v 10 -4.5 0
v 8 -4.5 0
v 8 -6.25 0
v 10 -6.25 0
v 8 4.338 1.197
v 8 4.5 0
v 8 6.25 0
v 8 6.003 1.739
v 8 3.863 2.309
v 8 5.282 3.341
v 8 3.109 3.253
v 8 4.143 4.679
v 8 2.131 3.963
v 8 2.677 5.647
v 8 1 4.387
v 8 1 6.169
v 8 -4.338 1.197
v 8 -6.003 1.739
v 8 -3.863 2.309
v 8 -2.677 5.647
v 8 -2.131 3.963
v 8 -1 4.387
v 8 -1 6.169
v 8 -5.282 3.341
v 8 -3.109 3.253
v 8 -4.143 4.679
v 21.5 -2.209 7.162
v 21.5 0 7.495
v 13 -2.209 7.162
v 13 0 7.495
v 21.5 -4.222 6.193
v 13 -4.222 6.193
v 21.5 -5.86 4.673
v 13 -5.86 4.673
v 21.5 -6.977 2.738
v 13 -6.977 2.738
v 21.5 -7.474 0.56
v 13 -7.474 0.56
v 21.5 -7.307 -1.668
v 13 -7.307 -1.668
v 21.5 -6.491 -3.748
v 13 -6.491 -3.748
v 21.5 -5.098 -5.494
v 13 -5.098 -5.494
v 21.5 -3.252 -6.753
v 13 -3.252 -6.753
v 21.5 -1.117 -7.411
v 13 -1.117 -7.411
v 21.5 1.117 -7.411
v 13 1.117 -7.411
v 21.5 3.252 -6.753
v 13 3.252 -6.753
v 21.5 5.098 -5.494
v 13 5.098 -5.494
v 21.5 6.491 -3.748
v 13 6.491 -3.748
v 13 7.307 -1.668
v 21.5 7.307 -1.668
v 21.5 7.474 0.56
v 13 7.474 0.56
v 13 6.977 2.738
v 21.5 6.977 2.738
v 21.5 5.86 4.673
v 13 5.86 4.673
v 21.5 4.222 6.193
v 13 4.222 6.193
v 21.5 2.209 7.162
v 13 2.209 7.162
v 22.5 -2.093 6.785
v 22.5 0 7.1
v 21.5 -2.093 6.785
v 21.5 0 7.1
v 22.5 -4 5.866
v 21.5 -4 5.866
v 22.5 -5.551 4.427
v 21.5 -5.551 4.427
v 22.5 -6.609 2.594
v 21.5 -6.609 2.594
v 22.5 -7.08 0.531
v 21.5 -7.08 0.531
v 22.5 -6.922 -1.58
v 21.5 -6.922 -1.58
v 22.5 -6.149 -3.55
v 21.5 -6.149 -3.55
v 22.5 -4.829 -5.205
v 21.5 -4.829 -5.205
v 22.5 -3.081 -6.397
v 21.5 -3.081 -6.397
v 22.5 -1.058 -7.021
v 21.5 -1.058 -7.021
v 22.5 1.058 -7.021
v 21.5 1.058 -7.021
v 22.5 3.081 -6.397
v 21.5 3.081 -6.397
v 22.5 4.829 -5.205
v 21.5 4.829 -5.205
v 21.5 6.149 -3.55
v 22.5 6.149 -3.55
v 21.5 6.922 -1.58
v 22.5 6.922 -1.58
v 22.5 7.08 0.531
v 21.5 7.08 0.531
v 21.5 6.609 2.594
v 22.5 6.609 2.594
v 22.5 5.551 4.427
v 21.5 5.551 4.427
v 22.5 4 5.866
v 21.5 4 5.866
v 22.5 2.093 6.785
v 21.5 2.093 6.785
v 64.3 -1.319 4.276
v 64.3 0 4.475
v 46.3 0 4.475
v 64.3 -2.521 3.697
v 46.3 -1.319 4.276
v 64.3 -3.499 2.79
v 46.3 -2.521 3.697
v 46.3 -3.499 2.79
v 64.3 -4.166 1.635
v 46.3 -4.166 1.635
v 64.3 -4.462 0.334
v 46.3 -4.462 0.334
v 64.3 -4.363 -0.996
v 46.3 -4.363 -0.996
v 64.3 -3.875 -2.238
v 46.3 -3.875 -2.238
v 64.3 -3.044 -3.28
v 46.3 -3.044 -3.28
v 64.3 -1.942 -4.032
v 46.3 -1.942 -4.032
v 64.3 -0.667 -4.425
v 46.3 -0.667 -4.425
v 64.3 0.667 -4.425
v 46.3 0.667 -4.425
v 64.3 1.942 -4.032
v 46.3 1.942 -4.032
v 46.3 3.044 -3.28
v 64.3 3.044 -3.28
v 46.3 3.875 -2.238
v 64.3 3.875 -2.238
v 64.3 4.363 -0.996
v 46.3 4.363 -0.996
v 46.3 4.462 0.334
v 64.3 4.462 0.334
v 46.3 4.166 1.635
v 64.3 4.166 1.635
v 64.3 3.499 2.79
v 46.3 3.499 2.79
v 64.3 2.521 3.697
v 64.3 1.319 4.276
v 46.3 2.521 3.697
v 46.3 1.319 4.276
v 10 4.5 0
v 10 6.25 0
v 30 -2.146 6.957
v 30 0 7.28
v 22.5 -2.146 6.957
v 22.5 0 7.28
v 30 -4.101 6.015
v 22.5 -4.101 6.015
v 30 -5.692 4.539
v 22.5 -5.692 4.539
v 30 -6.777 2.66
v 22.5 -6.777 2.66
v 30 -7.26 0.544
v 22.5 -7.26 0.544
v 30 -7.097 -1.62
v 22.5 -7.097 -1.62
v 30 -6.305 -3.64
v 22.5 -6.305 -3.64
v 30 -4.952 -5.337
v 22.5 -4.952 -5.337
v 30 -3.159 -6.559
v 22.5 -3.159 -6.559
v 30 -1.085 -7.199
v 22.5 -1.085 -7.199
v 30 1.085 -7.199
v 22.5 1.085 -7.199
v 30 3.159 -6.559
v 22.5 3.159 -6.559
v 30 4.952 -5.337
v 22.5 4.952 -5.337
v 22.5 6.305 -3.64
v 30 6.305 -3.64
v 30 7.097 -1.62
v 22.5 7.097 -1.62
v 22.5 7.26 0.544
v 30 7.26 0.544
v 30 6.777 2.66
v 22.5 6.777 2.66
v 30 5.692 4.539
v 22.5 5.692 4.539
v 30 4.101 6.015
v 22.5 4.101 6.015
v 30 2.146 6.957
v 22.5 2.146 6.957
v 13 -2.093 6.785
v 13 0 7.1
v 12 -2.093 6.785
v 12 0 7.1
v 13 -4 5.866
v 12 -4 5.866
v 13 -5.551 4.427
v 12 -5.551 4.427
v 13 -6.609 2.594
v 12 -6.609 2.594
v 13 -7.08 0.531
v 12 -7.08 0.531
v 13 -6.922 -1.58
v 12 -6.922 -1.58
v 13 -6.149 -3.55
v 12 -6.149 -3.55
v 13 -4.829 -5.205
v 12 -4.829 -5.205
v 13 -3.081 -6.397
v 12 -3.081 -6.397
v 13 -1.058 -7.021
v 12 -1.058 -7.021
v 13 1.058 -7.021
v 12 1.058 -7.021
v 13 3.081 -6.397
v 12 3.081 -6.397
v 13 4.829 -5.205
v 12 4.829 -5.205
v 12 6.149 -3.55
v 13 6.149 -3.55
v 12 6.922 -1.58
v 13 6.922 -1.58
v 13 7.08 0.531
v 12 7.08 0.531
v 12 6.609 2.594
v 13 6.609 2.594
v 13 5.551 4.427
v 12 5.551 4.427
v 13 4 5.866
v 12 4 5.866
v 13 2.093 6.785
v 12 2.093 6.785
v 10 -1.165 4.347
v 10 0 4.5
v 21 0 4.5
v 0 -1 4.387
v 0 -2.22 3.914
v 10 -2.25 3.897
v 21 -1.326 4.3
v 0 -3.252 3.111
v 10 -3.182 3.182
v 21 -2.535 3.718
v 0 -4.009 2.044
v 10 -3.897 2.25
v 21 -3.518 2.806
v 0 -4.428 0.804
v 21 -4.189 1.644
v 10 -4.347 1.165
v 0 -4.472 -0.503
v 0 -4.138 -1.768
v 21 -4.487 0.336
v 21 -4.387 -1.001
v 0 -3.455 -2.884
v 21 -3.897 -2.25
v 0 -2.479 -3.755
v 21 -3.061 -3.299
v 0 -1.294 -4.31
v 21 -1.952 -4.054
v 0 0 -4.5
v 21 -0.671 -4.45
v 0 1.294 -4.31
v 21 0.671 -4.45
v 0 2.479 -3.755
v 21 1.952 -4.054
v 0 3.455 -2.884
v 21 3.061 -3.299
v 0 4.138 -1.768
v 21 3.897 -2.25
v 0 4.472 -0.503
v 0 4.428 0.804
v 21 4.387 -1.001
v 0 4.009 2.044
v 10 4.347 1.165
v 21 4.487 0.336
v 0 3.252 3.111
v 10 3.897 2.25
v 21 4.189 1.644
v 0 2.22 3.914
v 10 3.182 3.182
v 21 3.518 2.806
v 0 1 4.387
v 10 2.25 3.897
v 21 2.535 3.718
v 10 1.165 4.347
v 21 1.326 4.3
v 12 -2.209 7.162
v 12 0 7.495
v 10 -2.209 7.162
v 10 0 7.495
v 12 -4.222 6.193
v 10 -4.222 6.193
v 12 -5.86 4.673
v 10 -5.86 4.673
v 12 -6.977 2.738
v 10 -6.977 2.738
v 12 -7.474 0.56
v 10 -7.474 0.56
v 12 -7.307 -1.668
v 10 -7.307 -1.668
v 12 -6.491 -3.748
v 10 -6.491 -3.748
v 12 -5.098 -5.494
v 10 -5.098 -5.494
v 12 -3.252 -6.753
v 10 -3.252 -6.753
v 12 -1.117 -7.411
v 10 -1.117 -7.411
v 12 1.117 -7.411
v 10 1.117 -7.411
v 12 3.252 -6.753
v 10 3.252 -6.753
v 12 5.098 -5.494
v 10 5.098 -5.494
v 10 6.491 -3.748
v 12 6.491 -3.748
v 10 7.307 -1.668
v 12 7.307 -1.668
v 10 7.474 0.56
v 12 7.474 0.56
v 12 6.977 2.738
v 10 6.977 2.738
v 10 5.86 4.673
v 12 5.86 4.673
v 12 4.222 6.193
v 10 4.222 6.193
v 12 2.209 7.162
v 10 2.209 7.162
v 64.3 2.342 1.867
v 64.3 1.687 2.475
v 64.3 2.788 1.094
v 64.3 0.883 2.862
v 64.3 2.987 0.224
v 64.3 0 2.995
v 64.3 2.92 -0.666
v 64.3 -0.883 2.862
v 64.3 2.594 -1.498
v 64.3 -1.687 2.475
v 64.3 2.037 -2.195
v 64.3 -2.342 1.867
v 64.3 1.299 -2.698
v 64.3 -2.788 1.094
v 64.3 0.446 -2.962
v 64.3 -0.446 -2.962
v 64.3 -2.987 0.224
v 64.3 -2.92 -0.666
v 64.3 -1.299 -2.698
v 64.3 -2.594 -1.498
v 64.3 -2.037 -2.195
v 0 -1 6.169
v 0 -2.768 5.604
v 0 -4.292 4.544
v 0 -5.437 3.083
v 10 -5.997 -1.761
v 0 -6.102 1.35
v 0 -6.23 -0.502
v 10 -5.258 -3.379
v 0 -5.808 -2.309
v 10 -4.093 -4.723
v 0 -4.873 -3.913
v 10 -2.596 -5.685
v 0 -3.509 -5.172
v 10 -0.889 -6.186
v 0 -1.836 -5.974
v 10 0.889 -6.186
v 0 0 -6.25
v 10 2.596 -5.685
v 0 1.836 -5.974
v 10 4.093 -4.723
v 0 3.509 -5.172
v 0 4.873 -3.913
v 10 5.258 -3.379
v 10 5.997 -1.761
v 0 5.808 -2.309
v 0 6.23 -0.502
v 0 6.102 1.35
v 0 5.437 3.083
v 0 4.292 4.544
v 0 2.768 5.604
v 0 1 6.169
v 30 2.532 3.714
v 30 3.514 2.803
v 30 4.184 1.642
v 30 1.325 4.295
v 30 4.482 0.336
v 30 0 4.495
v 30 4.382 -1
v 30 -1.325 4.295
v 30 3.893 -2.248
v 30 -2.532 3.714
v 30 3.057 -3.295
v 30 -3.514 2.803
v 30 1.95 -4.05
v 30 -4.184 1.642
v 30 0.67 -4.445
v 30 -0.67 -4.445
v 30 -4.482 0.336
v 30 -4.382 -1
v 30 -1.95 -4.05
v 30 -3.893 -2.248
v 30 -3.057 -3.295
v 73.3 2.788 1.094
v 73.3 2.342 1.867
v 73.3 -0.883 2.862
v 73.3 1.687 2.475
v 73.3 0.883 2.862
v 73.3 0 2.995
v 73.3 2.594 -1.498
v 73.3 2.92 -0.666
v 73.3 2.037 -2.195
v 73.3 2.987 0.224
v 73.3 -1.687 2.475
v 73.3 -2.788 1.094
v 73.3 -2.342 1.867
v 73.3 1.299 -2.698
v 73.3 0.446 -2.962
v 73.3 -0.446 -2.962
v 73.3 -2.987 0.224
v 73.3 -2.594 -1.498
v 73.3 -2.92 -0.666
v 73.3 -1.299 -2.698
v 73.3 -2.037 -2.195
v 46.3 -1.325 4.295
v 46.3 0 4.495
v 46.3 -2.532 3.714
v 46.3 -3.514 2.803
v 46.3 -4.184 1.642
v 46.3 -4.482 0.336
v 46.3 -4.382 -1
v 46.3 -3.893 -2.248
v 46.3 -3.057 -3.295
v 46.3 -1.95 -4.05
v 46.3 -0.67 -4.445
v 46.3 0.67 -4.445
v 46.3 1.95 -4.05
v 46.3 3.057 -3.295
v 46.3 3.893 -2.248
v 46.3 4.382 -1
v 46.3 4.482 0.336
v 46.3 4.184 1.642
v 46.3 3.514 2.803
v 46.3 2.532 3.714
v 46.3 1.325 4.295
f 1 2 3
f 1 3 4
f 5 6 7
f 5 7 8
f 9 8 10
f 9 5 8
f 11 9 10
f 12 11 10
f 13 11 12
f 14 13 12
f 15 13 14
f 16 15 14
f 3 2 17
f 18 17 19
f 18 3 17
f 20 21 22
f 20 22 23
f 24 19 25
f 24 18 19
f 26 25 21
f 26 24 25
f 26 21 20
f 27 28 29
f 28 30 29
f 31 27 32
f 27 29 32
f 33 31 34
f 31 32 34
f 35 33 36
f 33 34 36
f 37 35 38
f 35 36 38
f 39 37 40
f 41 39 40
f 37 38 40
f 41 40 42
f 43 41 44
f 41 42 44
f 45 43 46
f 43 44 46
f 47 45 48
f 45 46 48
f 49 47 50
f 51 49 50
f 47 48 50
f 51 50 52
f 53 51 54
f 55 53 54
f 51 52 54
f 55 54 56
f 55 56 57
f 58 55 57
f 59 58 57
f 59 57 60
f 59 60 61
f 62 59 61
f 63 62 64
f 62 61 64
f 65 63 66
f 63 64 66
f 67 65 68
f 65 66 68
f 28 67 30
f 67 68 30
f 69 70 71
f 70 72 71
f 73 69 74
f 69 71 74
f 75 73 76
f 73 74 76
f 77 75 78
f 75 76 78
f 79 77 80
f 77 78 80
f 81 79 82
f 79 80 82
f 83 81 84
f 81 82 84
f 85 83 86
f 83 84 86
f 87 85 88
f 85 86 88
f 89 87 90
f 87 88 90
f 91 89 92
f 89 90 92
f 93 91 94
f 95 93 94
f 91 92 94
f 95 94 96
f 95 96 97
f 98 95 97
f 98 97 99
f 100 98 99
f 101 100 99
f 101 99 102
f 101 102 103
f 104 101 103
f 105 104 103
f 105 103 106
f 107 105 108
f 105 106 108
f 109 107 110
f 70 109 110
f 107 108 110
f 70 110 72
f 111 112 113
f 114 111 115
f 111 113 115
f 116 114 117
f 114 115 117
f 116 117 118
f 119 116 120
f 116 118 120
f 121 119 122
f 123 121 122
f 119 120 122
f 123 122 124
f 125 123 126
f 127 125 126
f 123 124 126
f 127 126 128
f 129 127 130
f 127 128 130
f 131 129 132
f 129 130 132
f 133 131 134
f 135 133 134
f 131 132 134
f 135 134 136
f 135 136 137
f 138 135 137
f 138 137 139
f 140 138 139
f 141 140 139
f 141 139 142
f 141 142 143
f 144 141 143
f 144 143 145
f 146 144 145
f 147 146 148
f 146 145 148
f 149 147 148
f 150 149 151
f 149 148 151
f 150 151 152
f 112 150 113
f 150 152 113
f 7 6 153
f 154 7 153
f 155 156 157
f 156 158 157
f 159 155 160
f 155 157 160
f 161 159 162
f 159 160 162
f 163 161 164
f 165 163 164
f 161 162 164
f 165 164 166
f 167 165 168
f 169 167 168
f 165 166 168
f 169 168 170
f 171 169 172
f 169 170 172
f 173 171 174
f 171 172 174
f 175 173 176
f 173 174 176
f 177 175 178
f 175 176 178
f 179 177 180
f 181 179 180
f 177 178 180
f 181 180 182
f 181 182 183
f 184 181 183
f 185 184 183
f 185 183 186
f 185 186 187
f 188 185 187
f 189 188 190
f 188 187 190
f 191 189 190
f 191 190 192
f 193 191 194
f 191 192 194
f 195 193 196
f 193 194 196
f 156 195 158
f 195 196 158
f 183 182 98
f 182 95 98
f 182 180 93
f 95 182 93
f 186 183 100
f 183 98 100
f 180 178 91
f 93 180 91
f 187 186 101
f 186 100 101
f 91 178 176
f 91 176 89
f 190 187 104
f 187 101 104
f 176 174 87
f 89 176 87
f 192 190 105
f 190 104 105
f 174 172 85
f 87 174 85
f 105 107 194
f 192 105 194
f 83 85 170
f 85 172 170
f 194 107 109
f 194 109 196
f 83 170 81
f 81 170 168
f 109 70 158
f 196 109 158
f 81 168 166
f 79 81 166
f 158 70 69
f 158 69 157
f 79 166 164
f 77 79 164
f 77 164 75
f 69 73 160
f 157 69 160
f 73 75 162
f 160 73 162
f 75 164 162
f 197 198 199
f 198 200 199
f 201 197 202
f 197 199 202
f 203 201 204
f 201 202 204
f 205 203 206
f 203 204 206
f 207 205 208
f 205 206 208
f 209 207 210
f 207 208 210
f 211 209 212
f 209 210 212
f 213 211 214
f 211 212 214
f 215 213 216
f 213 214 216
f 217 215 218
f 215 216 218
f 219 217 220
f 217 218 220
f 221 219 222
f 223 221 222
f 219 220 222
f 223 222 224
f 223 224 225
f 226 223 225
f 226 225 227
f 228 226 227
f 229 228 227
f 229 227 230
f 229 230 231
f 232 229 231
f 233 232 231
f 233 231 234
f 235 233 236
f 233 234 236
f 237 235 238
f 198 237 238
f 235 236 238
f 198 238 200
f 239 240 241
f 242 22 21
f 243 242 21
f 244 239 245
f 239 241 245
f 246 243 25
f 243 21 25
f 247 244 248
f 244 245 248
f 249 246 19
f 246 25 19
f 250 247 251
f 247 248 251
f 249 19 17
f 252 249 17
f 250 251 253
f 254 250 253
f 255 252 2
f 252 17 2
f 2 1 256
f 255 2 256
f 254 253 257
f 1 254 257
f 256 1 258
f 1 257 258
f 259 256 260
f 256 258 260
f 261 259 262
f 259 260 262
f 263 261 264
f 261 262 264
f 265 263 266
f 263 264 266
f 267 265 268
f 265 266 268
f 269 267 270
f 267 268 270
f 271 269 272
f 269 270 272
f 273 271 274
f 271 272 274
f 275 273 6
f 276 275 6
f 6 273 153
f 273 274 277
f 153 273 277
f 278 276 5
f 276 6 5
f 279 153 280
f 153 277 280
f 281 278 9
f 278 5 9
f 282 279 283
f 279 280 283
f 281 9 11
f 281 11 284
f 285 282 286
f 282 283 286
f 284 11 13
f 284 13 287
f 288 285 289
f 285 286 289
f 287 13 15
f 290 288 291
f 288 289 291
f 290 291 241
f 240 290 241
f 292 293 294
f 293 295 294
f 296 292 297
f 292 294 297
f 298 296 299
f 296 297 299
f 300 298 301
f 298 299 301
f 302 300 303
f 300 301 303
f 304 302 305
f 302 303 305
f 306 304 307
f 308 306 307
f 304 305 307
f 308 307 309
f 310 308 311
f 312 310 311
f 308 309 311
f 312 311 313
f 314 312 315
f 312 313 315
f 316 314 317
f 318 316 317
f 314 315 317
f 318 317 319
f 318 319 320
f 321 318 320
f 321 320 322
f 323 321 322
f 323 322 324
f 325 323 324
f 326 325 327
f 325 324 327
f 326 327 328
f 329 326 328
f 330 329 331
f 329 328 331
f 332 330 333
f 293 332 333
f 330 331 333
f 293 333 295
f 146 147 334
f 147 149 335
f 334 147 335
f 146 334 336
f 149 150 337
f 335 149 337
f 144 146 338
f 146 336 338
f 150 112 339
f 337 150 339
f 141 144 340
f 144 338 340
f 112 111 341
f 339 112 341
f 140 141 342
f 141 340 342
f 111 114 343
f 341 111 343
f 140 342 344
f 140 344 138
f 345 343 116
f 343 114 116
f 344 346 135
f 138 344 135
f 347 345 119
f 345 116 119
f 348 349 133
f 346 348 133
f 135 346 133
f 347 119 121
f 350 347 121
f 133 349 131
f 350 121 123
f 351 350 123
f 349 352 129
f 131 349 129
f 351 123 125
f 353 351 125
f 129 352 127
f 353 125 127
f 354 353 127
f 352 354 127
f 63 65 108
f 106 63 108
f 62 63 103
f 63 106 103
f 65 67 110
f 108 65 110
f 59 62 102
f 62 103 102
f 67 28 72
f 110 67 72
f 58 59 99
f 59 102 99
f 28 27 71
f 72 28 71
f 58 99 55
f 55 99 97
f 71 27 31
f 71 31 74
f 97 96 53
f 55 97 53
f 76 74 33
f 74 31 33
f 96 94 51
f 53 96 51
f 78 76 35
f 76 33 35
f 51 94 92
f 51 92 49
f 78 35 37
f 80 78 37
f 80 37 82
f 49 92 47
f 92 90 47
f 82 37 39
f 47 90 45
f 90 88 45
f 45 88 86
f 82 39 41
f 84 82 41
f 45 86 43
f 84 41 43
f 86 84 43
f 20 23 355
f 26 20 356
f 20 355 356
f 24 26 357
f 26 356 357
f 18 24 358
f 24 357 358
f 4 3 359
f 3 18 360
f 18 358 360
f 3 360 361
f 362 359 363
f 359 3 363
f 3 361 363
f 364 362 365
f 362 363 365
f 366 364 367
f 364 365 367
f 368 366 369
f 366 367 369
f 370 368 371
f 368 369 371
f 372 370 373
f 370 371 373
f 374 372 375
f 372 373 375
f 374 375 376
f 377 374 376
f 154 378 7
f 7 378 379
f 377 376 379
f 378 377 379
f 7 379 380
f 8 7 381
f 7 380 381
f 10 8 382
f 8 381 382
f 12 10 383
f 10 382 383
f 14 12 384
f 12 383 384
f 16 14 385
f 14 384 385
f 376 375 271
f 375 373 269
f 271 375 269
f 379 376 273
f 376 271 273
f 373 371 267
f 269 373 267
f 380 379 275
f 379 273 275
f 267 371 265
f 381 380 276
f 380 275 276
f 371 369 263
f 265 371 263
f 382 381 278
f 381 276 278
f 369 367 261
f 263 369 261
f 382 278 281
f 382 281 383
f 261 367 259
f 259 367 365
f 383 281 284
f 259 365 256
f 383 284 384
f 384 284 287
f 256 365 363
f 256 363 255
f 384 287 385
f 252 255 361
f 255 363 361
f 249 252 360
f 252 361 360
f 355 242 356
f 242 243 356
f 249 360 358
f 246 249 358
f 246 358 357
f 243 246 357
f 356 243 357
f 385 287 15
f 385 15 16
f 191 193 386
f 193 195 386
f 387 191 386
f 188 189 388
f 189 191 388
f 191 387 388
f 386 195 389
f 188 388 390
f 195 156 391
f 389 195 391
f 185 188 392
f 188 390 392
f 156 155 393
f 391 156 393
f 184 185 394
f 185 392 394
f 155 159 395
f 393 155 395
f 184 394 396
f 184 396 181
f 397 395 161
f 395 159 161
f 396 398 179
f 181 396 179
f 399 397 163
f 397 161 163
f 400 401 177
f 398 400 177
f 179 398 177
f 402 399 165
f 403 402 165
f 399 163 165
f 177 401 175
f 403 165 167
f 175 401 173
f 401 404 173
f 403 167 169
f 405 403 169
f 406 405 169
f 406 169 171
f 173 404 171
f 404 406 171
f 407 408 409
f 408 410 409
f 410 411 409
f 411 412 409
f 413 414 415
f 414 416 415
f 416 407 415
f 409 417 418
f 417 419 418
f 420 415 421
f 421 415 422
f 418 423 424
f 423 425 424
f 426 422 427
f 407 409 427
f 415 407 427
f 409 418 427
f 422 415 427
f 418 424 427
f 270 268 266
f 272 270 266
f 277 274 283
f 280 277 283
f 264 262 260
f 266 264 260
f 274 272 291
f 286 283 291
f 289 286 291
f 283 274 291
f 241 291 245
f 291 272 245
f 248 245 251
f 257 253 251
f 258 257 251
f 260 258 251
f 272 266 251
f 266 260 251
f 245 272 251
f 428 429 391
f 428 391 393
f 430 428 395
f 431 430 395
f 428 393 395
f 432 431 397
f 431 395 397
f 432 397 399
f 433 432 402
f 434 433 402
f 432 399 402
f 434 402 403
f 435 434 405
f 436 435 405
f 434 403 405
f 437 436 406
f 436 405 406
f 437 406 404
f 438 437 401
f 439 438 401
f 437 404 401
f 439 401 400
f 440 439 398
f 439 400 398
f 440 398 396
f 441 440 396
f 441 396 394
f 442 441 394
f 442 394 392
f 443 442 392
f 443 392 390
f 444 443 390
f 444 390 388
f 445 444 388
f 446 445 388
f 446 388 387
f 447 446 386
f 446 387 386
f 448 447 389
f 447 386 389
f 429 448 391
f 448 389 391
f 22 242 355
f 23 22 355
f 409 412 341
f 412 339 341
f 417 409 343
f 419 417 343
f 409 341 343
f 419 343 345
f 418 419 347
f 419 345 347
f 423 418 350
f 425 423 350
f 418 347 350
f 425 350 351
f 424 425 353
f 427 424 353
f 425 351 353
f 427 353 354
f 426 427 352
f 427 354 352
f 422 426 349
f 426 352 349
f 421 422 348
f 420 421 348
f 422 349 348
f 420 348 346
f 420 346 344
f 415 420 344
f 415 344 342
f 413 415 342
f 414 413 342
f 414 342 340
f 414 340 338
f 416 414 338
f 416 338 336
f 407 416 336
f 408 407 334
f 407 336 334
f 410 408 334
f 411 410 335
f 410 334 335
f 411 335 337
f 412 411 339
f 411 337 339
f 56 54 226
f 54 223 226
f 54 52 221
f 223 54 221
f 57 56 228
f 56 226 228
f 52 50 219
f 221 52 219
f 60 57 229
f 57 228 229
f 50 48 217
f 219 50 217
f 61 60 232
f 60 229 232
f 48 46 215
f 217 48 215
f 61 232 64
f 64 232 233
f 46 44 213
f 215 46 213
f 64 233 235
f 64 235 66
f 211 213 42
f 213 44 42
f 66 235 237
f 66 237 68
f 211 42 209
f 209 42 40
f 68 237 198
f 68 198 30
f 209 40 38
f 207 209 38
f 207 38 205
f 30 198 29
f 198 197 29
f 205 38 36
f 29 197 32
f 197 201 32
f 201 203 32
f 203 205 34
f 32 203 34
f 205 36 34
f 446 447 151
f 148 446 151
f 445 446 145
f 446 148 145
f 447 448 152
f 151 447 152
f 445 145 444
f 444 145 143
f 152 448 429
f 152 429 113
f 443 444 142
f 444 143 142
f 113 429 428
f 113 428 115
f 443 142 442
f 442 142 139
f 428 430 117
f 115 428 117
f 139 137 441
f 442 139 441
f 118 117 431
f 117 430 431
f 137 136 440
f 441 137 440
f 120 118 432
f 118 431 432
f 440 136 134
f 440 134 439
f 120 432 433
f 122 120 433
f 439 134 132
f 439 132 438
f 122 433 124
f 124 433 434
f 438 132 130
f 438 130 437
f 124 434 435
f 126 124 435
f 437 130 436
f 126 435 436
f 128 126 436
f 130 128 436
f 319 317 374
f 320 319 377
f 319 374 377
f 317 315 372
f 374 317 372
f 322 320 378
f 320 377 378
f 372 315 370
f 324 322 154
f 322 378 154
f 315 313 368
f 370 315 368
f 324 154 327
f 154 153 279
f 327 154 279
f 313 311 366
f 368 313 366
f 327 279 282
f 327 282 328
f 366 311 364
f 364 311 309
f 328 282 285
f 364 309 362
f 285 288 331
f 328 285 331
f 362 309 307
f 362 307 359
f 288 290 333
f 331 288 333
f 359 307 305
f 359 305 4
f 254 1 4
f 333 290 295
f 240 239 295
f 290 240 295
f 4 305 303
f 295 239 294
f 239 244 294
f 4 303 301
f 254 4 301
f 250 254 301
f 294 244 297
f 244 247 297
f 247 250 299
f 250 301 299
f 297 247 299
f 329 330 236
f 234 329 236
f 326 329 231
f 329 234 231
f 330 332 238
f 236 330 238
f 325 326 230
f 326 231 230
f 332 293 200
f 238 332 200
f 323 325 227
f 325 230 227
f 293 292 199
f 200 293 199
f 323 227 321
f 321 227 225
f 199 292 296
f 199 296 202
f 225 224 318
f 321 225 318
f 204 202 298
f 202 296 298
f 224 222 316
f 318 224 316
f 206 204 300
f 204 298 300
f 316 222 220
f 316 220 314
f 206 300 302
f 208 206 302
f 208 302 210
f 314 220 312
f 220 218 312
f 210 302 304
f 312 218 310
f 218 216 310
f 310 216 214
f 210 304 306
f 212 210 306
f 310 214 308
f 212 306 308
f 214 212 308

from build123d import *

# Parameters (mm, degrees)
F2_W          = 2
F2_H          = 7.5
F3_DEPTH      = 7.496
F3_DEPTH_BACK = 7.496
F4_W          = 2
F4_H          = 7.495
F5_DEPTH      = 8


with BuildPart() as f1:
    # F0 (on Front) → F1 (revolve)
    with BuildSketch(Plane.XZ):
        Polygon((0, 6.25), (0, 4.5), (21, 4.5), (21, 0), (73.3, 0), (73.3, 2.995), (64.3, 2.995), (64.3, 4.475), (46.3, 4.475), (46.3, 4.495), (30, 4.495), (30, 7.28), (22.5, 7.28), (22.5, 7.1), (21.5, 7.1), (21.5, 7.495), (13, 7.495), (13, 7.1), (12, 7.1), (12, 7.495), (10, 7.495), (10, 6.25), align=None)
    revolve(axis=Axis((62.9070794401, 0, 0), (1, 0, 0)))

    # F2 (on Front) → F3 (cut, two sides)
    with BuildSketch(Plane.XZ) as f3_sk:
        with Locations((9, 3.75)):
            Rectangle(F2_W, F2_H)
    extrude(amount=-F3_DEPTH, mode=Mode.SUBTRACT)
    extrude(f3_sk.sketch, amount=F3_DEPTH_BACK, mode=Mode.SUBTRACT)

    # F4 (on face) → F5 (cut, through all)
    with BuildSketch(Plane(origin=(0, 0, 0), x_dir=(0, -1, 0), z_dir=(-1, 0, 0))):
        with Locations((0, 3.7475)):
            Rectangle(F4_W, F4_H)
    extrude(amount=-F5_DEPTH, mode=Mode.SUBTRACT)


solid = f1.part
